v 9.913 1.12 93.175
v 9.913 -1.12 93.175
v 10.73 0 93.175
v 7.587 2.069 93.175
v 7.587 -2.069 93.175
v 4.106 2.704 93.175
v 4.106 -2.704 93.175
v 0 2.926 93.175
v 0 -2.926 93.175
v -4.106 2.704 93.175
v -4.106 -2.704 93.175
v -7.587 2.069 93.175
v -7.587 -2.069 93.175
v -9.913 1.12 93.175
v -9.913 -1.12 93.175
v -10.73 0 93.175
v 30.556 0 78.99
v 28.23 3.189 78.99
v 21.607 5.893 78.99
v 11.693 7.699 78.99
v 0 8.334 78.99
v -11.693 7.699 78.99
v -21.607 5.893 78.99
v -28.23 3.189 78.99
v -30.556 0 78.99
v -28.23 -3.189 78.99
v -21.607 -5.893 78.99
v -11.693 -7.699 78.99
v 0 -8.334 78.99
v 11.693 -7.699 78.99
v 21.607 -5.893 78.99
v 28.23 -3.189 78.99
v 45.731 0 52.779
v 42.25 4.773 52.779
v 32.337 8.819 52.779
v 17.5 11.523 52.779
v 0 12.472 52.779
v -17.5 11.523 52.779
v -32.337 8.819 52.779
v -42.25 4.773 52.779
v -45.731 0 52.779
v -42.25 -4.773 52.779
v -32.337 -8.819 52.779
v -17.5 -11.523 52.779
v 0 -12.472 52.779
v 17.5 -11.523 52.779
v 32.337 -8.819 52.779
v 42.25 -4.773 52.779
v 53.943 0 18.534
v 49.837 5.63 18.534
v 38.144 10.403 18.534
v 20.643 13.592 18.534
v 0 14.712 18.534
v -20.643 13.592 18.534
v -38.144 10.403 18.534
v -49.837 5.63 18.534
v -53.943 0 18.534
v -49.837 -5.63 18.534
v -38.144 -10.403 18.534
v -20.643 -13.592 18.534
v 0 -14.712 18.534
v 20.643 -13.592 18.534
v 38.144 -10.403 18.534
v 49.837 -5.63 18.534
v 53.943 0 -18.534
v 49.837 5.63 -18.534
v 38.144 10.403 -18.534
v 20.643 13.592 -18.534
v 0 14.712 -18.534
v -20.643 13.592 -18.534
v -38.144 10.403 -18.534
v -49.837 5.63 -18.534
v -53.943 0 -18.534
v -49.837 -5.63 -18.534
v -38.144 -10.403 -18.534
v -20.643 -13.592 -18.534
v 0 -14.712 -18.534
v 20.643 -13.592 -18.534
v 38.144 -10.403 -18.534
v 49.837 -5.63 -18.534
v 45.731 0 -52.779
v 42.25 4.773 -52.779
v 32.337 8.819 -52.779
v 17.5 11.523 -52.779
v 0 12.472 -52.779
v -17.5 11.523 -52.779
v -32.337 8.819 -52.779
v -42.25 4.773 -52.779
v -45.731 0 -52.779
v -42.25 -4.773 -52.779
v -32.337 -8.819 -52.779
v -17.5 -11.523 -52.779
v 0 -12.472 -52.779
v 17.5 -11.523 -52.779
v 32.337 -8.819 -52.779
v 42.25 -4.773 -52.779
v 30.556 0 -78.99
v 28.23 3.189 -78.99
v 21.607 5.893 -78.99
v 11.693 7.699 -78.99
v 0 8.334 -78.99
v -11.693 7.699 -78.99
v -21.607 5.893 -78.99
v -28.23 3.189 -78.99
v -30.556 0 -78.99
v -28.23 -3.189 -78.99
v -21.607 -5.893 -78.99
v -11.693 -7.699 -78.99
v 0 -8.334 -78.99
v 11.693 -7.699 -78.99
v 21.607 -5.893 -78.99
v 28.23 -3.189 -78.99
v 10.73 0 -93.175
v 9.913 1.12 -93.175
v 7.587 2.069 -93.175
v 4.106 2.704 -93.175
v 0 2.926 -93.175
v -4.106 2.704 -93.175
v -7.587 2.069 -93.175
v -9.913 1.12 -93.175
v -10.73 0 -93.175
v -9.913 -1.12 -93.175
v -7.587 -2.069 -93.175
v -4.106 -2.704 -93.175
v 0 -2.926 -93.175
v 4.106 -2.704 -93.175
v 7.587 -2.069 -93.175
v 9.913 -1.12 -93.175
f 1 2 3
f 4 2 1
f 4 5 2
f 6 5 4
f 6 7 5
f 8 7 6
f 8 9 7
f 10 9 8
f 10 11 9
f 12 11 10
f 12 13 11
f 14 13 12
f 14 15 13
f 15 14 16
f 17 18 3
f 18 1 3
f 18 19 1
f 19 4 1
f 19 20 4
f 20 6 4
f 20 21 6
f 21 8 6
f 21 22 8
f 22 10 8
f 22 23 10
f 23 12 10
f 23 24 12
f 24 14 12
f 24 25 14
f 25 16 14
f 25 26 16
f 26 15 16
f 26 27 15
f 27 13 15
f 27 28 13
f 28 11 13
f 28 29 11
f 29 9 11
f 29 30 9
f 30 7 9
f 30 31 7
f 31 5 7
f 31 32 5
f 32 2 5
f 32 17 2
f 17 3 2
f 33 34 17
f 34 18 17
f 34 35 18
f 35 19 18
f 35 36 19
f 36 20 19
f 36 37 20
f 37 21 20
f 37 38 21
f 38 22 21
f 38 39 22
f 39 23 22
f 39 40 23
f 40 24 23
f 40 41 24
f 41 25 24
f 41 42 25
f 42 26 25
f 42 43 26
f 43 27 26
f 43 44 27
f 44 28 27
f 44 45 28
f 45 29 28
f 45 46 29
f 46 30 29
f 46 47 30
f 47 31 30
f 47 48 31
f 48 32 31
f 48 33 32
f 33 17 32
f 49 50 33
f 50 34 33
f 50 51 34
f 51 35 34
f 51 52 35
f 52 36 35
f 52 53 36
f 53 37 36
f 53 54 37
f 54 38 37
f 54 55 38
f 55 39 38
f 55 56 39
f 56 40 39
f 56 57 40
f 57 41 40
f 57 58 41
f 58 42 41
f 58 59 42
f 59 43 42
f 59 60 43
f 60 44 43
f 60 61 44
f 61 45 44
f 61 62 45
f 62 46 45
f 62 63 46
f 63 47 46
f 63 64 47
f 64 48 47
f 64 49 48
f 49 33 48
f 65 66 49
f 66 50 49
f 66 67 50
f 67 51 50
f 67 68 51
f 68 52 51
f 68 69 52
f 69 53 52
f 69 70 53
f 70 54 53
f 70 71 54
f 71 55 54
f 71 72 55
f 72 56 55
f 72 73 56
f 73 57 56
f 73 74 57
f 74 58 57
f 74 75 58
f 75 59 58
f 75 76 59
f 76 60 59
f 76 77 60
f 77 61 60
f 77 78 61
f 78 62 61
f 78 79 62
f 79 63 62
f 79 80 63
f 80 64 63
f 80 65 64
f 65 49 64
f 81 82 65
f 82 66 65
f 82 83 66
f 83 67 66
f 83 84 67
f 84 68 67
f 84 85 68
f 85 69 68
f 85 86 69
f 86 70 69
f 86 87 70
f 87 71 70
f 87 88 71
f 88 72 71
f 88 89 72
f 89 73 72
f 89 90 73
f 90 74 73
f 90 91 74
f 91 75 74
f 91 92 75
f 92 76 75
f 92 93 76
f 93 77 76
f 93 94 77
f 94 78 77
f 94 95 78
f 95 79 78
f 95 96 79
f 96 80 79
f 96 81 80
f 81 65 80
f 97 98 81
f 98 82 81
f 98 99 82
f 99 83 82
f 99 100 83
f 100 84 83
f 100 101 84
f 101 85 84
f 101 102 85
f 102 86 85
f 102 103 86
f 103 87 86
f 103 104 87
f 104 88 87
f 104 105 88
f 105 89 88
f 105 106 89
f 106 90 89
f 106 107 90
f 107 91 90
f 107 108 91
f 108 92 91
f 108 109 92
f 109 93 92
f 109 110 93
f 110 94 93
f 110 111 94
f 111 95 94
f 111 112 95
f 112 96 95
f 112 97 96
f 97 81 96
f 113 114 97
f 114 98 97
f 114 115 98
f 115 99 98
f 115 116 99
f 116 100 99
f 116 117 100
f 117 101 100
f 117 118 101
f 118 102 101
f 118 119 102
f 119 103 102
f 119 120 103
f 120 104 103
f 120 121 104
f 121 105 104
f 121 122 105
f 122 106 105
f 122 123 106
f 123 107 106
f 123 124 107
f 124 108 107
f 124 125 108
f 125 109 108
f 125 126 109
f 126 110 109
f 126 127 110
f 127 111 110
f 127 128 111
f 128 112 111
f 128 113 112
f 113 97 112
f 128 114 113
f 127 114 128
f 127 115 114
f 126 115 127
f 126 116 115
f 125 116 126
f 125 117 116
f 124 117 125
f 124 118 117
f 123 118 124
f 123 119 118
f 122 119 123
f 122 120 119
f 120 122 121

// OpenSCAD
// Generated by SolidPython 1.0.1 on 2020-07-29 00:46:49


scale(v = [11, 3, 19]) {
	sphere(r = 5);
}
/***********************************************
*********      SolidPython code:      **********
************************************************
 
# import packages: SolidPython
from solid import *
from solid.utils import *
from itertools import chain, combinations, permutations


class Resize:

    def __init__(self, scad_file):
        self.scad_file = scad_file
        #self.scad_file = import_scad(scad_file)
        # cone/cylinder param:
        self.r1 = 0
        self.r2 = 0
        self.h = 0
        # rectangular prism param:
        self.w = 0
        self.l = 0
        # ellipse param:
        self.r = 0

    # import OpenScad code (file name corresponds to shape)


    # classify shape + parameters
    def assign(self, param1, param2, param3):
        if self.scad_file == 'cone.scad':
            self.r1 = param1
            self.r2 = param2
            self.h = param3
        elif self.scad_file == 'cylinder.scad':
            self.r1 = param1
            self.r2 = param2
            self.h = param3
        elif self.scad_file == 'rectangularPrism.scad':
            self.h = param1
            self.l = param2
            self.w = param3
        else:
            self.r = param1
            self.h = param2

    # resize parameters
    def iterate(self):
        x = range(3, 20, 2)
        i = 1
        if self.scad_file == 'cone.scad':
            tempList = list(permutations(x, 2))
            for temp in tempList:
                param1 = temp[0]
                param2 = temp[1]
                filepath = 'produced_scad_files/' + 'cone' + str(param1) + '_' + str(param2) + '_' + '.scad'
                scad_render_to_file(cylinder(h=param1, r1=param2, r2=0), filepath)

        elif self.scad_file == 'cylinder.scad':
            tempList = list(permutations(x, 3))
            for temp in tempList:
                param1 = temp[0]
                param2 = temp[1]
                filepath = 'produced_scad_files/' + 'cylinder' + str(param1) + '_' + str(param2) + '_' + '.scad'
                scad_render_to_file(cylinder(h=param1, r1=param2, r2=param2), filepath)

        elif self.scad_file == 'rectangularPrism.scad':
            tempList = list(permutations(x, 3))
            for temp in tempList:
                param1 = temp[0]
                param2 = temp[1]
                param3 = temp[2]
                filepath = 'produced_scad_files/' + 'rectangularPrism' + str(param1) + '_' + str(param2) + '_' + str(
                    param3) + '.scad'
                scad_render_to_file(cube(size=(param1, param2, param3)), filepath)

        elif self.scad_file == 'ellipse.scad':
            tempList = list(permutations(x, 4))
            for temp in tempList:
                param1 = temp[0]
                param2 = temp[1]
                param3 = temp[2]
                param4 = temp[3]
                filepath = 'produced_scad_files/' + 'ellipse' + str(param1) + '_' + str(param2) + '_' + str(param3) + '_' + str(param4) + '.scad'
                scad_render_to_file(scale([param1, param2, param3])(sphere(r=param4)), filepath)

    def render_to_scadfile(self):
        scad_render_to_file(scad, 'example.scad') 
 
************************************************/
